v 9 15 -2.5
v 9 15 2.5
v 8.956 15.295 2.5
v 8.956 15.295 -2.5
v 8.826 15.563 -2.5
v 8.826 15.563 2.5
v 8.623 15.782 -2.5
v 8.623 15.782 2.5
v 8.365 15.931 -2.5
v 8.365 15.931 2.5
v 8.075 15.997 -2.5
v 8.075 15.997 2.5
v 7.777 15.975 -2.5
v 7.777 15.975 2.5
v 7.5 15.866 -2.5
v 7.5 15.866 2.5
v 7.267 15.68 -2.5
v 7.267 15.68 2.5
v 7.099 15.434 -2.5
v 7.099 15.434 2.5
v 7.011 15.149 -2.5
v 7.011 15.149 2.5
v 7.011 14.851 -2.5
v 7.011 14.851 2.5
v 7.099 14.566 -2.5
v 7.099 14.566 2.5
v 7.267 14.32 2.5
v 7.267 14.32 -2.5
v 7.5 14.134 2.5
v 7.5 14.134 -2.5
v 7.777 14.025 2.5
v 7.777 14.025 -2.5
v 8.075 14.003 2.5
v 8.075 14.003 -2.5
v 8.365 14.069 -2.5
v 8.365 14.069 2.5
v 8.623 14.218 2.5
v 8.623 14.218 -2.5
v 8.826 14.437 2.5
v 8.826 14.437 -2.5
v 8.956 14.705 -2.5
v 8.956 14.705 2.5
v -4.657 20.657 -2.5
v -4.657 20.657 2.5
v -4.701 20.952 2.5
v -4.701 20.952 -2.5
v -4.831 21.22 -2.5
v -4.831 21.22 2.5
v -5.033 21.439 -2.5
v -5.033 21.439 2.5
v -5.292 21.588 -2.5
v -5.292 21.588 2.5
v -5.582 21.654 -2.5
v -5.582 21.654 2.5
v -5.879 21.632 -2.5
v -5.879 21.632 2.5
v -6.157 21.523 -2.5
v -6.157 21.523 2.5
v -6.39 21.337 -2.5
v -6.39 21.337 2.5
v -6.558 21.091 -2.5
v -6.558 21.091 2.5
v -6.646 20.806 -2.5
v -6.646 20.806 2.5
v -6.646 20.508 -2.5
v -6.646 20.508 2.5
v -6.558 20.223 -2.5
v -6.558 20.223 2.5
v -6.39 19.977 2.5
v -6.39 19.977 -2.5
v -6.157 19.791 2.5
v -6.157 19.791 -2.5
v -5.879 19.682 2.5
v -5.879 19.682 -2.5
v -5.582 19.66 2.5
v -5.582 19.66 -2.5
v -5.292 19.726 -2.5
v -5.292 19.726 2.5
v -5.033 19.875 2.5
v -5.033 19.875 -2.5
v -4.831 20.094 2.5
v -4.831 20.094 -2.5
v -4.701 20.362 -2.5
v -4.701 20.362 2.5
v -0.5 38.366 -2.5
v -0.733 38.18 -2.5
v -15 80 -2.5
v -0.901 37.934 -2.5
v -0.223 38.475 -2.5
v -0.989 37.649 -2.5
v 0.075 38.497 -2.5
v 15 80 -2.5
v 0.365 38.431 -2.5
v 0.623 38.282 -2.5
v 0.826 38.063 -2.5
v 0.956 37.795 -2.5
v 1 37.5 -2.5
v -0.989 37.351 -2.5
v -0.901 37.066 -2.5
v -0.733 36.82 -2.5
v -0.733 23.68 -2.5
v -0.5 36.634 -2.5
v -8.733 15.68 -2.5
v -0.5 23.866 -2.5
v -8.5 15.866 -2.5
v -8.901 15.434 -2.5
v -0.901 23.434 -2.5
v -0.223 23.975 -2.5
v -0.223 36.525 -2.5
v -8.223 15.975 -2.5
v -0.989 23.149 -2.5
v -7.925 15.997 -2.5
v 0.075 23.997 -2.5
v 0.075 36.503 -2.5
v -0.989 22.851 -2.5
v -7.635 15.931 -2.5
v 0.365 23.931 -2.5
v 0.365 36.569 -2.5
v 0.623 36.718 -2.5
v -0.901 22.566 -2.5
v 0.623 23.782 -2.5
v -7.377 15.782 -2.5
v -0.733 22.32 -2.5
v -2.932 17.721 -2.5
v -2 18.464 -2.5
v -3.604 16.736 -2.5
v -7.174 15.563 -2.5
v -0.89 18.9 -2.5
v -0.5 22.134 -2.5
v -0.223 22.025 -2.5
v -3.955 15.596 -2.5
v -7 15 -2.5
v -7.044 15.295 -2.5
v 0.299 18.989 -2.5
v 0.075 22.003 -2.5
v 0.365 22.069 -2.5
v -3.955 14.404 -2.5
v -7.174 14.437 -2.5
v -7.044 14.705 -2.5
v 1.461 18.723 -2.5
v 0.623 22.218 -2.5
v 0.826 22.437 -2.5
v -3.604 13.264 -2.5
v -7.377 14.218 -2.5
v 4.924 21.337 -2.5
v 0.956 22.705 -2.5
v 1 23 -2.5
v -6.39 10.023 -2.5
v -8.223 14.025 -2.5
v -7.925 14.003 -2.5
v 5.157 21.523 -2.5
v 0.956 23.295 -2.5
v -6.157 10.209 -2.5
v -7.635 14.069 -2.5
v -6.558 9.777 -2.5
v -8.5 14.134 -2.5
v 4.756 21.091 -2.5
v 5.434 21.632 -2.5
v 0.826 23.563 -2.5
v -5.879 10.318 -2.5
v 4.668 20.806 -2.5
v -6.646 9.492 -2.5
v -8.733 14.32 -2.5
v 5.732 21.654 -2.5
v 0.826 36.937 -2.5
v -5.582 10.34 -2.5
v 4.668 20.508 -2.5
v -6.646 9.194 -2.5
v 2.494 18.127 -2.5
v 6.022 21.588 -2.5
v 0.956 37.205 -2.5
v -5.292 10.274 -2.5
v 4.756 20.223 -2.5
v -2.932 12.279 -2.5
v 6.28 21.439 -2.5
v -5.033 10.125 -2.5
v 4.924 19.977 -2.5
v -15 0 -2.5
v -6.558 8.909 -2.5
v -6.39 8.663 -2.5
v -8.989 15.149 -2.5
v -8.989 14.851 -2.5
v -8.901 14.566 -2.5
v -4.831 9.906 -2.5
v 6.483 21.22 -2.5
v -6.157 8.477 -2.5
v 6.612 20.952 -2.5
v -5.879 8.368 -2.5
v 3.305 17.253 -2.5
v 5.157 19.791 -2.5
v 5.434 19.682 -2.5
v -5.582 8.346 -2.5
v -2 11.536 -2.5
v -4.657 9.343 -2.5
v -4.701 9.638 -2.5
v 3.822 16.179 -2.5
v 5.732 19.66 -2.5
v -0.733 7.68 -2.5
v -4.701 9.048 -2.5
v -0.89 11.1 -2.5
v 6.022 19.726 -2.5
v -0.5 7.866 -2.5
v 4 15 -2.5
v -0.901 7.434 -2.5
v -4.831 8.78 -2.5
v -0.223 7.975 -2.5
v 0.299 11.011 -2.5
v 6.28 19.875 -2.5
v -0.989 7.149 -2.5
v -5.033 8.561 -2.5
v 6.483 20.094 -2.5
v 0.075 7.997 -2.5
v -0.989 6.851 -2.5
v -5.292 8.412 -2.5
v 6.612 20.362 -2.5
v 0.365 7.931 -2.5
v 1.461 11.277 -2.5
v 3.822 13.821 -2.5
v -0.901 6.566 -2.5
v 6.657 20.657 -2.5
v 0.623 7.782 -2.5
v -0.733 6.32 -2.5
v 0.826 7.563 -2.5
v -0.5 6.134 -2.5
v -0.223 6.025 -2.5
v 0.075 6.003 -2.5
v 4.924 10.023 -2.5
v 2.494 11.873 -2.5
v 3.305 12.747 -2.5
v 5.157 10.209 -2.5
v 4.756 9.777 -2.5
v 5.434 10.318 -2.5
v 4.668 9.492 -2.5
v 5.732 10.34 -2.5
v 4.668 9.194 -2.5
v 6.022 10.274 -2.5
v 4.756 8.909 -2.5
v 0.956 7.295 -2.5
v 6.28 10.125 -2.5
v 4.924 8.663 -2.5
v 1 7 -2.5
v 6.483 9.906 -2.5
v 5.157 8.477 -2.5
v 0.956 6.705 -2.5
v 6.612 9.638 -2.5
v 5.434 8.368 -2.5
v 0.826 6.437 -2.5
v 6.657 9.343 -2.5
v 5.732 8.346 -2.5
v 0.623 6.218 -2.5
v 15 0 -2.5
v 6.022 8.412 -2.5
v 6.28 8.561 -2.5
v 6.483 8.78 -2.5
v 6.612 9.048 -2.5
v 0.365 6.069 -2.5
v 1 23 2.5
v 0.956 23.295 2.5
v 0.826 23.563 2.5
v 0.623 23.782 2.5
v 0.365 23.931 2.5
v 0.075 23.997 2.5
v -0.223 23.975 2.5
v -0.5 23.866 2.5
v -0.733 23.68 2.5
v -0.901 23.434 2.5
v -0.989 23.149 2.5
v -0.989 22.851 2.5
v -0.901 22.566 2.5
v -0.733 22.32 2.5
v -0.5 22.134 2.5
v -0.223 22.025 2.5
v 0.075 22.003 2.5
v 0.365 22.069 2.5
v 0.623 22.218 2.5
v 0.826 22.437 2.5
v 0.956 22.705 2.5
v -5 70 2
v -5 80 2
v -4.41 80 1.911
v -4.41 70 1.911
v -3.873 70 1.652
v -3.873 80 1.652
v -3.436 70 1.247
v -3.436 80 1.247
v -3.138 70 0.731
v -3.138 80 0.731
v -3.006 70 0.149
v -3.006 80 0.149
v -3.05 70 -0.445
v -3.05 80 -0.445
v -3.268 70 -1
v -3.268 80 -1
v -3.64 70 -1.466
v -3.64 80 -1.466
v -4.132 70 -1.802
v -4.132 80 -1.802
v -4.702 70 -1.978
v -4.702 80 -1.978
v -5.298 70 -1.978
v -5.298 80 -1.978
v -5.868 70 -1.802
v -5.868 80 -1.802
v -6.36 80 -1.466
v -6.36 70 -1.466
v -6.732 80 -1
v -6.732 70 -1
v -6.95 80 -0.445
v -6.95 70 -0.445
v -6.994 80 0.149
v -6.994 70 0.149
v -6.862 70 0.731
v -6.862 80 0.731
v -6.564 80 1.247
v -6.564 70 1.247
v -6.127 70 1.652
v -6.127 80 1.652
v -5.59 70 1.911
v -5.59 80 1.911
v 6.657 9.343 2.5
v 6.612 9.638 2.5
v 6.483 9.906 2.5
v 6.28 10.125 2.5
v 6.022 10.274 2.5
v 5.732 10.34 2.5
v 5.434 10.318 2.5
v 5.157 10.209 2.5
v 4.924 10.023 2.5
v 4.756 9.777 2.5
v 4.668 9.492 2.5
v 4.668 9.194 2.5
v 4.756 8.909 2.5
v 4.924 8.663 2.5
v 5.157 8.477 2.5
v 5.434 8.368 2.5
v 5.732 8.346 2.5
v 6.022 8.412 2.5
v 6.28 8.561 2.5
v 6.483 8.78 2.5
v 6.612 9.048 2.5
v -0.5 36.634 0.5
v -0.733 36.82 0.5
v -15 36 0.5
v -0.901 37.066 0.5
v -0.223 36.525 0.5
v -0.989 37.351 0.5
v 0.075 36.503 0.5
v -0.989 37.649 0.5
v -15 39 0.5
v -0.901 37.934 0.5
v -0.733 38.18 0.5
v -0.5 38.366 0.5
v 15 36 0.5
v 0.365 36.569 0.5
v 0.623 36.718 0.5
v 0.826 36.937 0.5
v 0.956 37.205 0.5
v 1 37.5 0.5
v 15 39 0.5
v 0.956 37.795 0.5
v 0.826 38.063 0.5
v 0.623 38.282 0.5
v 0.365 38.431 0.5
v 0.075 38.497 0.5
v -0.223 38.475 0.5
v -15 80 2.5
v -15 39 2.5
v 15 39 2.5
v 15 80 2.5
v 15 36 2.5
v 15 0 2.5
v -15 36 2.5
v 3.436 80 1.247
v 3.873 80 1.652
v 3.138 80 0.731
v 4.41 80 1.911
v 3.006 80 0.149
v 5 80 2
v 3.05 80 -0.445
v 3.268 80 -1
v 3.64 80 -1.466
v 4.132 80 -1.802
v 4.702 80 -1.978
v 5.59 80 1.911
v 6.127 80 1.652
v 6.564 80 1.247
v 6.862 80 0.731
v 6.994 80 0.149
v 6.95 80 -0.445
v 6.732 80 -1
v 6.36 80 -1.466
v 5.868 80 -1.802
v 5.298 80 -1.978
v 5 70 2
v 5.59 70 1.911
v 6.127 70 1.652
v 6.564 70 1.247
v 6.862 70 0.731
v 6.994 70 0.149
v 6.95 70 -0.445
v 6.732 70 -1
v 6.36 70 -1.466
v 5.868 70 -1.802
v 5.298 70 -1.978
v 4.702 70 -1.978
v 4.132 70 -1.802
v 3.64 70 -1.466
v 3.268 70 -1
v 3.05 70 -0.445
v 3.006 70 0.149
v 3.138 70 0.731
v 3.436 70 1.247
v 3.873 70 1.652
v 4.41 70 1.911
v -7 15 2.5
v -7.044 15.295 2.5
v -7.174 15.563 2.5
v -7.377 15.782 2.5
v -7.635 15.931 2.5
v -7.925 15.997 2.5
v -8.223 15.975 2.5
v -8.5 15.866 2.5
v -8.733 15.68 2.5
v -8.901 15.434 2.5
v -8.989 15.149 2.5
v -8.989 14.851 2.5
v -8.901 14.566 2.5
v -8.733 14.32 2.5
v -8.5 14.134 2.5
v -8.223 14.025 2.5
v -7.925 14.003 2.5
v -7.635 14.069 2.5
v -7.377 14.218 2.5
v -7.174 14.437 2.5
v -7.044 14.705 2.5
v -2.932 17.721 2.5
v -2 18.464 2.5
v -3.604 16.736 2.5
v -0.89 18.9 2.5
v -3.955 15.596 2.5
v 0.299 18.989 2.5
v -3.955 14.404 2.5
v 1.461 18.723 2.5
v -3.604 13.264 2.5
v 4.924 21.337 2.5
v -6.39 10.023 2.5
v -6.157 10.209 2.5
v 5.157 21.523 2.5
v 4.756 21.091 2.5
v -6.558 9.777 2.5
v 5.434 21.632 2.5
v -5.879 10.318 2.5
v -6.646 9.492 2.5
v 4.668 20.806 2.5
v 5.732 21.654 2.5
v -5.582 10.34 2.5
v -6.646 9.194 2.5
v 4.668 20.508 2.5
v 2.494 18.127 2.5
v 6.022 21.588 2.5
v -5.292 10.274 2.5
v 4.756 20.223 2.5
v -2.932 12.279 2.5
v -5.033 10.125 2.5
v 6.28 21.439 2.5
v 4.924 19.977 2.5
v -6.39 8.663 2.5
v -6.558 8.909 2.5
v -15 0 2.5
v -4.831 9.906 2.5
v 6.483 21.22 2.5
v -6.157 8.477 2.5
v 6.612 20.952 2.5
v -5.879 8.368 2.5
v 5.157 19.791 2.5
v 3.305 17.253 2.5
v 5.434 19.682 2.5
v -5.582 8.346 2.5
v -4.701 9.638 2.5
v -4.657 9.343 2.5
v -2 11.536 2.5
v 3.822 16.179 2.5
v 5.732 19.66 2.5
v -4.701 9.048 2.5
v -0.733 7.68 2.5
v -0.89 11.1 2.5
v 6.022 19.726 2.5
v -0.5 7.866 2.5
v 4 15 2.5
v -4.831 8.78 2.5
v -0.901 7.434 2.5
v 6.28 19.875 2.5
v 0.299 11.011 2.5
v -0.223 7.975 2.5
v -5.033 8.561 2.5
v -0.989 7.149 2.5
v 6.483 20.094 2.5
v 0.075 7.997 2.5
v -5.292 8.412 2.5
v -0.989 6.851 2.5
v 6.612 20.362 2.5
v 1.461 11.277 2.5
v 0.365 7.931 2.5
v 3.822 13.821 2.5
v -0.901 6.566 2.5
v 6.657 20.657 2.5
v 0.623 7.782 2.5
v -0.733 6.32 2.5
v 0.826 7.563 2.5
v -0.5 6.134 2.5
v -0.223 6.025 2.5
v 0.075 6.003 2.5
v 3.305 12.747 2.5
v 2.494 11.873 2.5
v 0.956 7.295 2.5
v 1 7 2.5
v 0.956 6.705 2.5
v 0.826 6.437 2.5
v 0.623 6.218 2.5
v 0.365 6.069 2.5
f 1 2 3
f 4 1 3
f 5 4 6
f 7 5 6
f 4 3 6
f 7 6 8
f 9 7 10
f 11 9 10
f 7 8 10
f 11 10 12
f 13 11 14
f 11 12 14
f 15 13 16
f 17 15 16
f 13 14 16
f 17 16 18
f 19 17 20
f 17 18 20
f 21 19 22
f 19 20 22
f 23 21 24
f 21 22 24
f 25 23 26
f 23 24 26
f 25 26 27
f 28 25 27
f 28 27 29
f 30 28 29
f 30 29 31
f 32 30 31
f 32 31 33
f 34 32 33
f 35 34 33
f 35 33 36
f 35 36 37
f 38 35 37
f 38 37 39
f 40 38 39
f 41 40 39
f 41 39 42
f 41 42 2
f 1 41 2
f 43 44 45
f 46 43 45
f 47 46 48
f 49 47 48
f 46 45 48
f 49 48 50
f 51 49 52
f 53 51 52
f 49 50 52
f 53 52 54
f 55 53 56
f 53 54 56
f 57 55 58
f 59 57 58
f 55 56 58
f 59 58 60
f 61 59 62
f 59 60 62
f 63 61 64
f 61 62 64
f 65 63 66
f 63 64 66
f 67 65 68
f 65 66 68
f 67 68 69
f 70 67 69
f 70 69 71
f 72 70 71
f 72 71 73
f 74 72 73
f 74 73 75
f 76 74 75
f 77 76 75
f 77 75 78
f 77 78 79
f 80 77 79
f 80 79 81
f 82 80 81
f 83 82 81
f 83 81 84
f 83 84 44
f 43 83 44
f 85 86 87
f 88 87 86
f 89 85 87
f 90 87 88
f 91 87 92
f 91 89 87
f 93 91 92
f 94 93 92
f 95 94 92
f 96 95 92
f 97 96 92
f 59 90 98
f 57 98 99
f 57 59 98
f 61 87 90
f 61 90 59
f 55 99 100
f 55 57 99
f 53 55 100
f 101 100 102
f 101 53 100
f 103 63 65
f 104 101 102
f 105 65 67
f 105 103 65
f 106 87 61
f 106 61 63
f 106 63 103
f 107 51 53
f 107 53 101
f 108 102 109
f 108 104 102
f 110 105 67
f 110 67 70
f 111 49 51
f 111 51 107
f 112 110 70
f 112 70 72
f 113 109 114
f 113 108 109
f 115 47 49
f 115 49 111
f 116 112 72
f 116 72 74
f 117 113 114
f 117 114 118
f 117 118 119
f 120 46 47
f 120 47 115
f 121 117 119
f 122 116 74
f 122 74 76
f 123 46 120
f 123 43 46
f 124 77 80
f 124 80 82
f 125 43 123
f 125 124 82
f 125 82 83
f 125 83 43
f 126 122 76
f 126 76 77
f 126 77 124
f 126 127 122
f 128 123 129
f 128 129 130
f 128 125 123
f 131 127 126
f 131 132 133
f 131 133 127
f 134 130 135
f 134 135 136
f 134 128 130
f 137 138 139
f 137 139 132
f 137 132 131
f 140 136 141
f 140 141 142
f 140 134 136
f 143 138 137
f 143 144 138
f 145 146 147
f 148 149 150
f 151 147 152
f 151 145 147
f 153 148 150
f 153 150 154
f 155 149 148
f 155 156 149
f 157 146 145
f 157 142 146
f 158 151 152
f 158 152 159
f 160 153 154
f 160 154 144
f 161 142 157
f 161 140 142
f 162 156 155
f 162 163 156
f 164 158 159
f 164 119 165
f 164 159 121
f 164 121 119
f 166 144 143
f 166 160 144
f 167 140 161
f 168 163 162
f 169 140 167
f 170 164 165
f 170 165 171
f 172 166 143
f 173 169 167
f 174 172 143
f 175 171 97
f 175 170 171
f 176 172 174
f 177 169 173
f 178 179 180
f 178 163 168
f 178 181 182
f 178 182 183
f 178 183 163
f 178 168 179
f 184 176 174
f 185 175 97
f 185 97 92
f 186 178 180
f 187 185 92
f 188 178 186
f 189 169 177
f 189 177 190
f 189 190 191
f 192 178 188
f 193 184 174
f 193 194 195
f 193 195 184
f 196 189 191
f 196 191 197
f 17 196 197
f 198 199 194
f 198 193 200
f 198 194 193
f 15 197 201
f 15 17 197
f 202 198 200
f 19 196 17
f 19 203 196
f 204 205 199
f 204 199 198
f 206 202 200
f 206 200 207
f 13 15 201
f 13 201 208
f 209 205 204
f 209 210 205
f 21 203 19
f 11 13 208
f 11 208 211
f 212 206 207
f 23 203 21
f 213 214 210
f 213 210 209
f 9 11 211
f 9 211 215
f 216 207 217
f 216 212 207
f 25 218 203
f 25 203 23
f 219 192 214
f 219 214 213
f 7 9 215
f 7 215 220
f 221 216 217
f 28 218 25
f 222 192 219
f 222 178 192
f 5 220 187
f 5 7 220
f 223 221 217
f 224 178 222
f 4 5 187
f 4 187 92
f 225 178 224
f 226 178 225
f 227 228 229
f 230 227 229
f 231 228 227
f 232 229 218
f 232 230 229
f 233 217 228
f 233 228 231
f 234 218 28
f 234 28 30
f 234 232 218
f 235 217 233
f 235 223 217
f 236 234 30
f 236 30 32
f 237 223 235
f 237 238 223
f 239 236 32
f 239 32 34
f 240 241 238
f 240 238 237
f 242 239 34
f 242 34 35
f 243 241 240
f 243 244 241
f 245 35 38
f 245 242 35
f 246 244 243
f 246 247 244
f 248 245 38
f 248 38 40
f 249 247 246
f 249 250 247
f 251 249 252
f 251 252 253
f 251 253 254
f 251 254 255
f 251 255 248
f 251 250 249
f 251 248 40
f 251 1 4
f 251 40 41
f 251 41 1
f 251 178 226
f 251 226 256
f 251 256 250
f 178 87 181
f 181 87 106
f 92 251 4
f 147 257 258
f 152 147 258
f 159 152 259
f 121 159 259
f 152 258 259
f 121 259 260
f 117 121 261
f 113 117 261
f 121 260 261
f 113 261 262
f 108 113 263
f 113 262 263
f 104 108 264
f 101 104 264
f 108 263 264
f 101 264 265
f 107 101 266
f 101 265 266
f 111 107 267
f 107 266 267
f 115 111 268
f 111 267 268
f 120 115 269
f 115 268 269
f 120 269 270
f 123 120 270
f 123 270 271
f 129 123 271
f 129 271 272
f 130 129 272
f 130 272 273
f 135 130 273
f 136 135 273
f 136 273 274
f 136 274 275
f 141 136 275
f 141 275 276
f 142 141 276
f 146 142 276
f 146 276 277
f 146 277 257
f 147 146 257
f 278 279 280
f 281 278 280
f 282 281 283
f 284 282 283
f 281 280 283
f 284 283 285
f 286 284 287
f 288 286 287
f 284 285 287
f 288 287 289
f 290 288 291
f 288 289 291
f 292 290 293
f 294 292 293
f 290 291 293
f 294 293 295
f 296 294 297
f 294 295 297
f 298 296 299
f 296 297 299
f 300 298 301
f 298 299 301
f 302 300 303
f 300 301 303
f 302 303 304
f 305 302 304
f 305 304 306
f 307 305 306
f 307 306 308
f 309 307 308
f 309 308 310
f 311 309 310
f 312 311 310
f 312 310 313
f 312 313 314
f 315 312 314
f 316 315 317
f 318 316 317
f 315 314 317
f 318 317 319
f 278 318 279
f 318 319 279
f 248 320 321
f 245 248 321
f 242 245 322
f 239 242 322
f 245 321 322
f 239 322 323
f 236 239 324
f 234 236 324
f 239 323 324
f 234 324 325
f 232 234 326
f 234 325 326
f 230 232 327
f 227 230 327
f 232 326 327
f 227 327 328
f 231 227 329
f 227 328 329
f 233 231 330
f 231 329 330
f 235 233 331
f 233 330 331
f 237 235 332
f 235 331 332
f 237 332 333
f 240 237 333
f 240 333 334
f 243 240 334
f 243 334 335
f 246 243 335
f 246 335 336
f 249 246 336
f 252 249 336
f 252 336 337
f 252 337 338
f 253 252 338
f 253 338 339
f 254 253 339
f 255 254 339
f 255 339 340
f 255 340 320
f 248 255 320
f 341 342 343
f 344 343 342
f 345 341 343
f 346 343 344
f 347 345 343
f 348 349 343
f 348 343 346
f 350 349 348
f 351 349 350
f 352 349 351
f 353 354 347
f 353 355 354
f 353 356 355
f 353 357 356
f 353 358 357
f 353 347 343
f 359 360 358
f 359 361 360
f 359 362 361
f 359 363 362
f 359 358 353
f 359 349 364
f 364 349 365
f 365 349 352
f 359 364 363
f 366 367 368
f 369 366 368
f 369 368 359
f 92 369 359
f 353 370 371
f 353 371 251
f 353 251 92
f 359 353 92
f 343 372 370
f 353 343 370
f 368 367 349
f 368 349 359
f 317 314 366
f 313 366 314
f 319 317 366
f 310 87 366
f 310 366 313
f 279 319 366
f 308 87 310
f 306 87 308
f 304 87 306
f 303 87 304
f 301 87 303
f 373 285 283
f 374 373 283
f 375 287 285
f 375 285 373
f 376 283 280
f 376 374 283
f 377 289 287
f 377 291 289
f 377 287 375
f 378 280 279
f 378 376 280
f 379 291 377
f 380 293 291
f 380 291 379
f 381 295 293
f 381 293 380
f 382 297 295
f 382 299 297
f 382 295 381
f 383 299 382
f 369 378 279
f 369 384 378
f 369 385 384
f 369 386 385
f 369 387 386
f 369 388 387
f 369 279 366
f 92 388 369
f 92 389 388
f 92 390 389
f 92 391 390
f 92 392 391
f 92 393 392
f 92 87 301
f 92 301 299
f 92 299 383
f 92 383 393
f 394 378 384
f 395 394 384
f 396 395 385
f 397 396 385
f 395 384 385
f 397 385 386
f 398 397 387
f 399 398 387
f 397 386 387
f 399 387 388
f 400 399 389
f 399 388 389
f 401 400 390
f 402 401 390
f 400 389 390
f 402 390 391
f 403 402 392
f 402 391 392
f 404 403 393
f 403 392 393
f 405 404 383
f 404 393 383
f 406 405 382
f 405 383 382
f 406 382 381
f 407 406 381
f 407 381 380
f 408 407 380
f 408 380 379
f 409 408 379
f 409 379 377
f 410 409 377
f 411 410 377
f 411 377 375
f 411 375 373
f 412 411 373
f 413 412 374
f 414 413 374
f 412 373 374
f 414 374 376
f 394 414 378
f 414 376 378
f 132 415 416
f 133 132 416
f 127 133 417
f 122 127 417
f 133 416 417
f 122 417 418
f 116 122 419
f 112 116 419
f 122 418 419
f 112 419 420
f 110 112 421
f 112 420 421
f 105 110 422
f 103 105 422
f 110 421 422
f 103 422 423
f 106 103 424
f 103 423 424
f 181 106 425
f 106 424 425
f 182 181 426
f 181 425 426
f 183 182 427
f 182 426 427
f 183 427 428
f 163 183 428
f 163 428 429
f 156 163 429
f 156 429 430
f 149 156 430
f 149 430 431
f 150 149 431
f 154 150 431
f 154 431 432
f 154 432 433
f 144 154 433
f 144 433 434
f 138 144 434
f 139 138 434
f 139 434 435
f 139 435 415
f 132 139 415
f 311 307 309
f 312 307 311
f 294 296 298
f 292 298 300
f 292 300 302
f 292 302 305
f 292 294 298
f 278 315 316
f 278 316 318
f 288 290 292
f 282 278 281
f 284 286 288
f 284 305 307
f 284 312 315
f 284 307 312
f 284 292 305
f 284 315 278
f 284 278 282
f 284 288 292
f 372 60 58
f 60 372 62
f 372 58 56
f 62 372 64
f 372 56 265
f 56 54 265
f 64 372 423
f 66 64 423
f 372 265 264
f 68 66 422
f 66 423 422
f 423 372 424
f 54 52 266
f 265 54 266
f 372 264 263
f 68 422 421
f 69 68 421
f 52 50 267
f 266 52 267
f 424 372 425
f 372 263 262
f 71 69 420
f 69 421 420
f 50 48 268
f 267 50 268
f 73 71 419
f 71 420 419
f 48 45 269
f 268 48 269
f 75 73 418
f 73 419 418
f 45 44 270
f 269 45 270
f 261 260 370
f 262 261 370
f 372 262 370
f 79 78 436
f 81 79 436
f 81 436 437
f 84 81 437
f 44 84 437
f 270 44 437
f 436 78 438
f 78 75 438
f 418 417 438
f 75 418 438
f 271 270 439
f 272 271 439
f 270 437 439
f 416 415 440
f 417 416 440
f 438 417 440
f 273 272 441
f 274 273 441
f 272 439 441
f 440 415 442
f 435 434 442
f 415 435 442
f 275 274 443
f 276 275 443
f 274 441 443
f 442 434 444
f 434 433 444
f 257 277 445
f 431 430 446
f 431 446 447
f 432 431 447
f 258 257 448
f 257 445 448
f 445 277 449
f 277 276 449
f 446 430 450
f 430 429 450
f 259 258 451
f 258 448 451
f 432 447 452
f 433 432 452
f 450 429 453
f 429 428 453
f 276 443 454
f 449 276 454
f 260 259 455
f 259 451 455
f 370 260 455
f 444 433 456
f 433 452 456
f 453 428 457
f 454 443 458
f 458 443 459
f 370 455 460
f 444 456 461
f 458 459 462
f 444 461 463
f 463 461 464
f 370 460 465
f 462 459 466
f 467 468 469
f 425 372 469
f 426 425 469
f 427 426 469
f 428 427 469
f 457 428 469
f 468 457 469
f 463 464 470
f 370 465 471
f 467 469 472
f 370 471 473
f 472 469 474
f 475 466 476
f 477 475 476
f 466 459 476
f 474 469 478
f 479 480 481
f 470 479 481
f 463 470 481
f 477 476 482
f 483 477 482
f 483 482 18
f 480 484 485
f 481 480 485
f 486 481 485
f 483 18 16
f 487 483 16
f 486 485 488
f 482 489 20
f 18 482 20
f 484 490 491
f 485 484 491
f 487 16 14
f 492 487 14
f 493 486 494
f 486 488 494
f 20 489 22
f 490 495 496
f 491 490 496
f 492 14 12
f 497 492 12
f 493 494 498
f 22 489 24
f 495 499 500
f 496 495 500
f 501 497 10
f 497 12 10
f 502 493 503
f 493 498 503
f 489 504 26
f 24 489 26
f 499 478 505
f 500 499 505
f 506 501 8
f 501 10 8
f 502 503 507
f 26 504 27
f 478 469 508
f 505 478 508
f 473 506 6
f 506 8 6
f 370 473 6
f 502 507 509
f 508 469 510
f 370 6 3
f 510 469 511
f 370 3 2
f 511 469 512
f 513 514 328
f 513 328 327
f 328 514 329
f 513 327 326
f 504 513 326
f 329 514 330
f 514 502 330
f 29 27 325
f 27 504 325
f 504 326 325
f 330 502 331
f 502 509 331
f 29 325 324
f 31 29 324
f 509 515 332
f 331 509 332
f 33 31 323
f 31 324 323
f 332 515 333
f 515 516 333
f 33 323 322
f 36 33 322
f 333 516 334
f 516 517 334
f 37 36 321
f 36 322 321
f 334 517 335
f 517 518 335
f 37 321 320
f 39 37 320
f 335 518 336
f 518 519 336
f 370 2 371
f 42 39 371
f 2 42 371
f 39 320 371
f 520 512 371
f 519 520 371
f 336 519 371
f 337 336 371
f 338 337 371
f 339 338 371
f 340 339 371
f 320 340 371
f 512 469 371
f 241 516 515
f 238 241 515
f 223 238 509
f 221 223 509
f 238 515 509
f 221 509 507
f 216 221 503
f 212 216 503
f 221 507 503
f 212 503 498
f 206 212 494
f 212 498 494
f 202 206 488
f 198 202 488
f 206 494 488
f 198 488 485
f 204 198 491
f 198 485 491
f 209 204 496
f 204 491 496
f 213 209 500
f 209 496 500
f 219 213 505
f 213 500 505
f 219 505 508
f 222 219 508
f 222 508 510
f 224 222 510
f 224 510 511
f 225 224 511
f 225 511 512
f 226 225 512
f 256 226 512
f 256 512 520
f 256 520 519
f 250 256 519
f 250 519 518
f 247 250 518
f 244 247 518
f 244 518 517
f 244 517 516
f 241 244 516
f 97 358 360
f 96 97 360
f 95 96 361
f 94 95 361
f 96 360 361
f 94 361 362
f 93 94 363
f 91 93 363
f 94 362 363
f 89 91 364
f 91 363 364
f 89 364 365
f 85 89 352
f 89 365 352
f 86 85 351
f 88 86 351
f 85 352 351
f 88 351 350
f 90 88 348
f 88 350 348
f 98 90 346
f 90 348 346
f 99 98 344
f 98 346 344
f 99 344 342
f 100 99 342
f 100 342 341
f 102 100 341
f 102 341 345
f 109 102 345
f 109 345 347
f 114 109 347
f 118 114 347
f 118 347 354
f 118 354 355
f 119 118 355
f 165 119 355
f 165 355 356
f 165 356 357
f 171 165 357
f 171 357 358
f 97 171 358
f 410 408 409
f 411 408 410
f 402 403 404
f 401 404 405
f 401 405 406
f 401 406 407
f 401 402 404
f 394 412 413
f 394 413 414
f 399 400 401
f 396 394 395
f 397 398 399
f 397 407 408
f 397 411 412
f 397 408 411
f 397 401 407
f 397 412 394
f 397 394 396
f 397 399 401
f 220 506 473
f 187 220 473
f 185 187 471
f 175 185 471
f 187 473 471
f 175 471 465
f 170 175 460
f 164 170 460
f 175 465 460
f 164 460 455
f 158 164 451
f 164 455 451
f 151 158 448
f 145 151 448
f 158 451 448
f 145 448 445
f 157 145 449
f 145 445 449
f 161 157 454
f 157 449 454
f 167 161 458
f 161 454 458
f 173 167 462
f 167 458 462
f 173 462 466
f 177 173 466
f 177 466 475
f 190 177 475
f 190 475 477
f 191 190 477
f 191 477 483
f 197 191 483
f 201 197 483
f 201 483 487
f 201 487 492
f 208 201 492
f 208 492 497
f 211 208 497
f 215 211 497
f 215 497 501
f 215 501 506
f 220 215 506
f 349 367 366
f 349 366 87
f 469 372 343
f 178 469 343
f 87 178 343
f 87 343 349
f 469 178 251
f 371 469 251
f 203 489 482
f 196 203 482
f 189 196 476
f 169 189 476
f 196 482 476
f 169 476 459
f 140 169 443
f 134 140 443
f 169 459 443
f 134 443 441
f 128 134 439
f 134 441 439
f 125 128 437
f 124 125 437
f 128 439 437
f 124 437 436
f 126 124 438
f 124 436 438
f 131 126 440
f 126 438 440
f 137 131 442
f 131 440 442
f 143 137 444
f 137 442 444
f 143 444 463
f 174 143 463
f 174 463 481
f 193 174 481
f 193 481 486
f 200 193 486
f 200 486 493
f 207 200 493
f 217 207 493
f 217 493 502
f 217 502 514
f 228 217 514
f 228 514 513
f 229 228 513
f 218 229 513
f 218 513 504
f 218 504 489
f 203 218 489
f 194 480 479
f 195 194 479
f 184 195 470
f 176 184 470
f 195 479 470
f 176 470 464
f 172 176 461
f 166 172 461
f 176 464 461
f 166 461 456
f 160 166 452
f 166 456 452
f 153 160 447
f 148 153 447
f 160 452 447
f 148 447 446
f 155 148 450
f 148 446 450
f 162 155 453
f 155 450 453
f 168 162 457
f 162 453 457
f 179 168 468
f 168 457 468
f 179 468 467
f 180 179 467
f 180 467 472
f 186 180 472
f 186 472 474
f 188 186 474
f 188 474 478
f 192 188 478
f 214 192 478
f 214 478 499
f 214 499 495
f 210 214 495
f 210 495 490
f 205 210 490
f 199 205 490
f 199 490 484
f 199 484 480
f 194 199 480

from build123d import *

# Parameters (mm, degrees)
SKETCH1_W           = 30
SKETCH1_H           = 5
BOSS_EXTRUDE1_DEPTH = 80
SKETCH2_R           = 2
CUT_EXTRUDE1_DEPTH  = 10
SKETCH3_R           = 1
SKETCH3_R_2         = 4
CUT_EXTRUDE3_DEPTH  = 82.547532152
SKETCH5_W           = 30
SKETCH5_H           = 3
CUT_EXTRUDE4_DEPTH  = 2
SKETCH6_R           = 1
CUT_EXTRUDE5_DEPTH  = 82.449370777


with BuildPart() as part:
    # Sketch1 → Boss-Extrude1 (new body)
    with BuildSketch(Plane(origin=(0, 0, 0), x_dir=(1, 0, 0), z_dir=(0, 1, 0))):
        Rectangle(SKETCH1_W, SKETCH1_H)
    extrude(amount=BOSS_EXTRUDE1_DEPTH)

    # Sketch2 → Cut-Extrude1 (cut)
    with BuildSketch(Plane(origin=(0, 80, 0), x_dir=(1, 0, 0), z_dir=(0, 1, 0))):
        with Locations((-5, 0)):
            Circle(SKETCH2_R)
        with Locations((5, 0)):
            Circle(SKETCH2_R)
    extrude(amount=-CUT_EXTRUDE1_DEPTH, mode=Mode.SUBTRACT)

    # Sketch3 → Cut-Extrude3 (cut, through all)
    with BuildSketch(Plane.XY.offset(2.5)):
        with Locations((0, 23)):
            Circle(SKETCH3_R)
        with Locations((-5.656854249, 20.656854249)):
            Circle(SKETCH3_R)
        with Locations((0, 15)):
            Circle(SKETCH3_R_2)
        with Locations((5.656854249, 20.656854249)):
            Circle(SKETCH3_R)
        with Locations((-8, 15)):
            Circle(SKETCH3_R)
        with Locations((0, 7)):
            Circle(SKETCH3_R)
        with Locations((8, 15)):
            Circle(SKETCH3_R)
        with Locations((-5.656854249, 9.343145751)):
            Circle(SKETCH3_R)
        with Locations((5.656854249, 9.343145751)):
            Circle(SKETCH3_R)
    extrude(amount=-CUT_EXTRUDE3_DEPTH, mode=Mode.SUBTRACT)

    # Sketch5 → Cut-Extrude4 (cut)
    with BuildSketch(Plane.XY.offset(2.5)):
        with Locations((0, 37.5)):
            Rectangle(SKETCH5_W, SKETCH5_H)
    extrude(amount=-CUT_EXTRUDE4_DEPTH, mode=Mode.SUBTRACT)

    # Sketch6 → Cut-Extrude5 (cut, through all)
    with BuildSketch(Plane.XY.offset(0.5)):
        with Locations((0, 37.5)):
            Circle(SKETCH6_R)
    extrude(amount=-CUT_EXTRUDE5_DEPTH, mode=Mode.SUBTRACT)


solid = part.part
